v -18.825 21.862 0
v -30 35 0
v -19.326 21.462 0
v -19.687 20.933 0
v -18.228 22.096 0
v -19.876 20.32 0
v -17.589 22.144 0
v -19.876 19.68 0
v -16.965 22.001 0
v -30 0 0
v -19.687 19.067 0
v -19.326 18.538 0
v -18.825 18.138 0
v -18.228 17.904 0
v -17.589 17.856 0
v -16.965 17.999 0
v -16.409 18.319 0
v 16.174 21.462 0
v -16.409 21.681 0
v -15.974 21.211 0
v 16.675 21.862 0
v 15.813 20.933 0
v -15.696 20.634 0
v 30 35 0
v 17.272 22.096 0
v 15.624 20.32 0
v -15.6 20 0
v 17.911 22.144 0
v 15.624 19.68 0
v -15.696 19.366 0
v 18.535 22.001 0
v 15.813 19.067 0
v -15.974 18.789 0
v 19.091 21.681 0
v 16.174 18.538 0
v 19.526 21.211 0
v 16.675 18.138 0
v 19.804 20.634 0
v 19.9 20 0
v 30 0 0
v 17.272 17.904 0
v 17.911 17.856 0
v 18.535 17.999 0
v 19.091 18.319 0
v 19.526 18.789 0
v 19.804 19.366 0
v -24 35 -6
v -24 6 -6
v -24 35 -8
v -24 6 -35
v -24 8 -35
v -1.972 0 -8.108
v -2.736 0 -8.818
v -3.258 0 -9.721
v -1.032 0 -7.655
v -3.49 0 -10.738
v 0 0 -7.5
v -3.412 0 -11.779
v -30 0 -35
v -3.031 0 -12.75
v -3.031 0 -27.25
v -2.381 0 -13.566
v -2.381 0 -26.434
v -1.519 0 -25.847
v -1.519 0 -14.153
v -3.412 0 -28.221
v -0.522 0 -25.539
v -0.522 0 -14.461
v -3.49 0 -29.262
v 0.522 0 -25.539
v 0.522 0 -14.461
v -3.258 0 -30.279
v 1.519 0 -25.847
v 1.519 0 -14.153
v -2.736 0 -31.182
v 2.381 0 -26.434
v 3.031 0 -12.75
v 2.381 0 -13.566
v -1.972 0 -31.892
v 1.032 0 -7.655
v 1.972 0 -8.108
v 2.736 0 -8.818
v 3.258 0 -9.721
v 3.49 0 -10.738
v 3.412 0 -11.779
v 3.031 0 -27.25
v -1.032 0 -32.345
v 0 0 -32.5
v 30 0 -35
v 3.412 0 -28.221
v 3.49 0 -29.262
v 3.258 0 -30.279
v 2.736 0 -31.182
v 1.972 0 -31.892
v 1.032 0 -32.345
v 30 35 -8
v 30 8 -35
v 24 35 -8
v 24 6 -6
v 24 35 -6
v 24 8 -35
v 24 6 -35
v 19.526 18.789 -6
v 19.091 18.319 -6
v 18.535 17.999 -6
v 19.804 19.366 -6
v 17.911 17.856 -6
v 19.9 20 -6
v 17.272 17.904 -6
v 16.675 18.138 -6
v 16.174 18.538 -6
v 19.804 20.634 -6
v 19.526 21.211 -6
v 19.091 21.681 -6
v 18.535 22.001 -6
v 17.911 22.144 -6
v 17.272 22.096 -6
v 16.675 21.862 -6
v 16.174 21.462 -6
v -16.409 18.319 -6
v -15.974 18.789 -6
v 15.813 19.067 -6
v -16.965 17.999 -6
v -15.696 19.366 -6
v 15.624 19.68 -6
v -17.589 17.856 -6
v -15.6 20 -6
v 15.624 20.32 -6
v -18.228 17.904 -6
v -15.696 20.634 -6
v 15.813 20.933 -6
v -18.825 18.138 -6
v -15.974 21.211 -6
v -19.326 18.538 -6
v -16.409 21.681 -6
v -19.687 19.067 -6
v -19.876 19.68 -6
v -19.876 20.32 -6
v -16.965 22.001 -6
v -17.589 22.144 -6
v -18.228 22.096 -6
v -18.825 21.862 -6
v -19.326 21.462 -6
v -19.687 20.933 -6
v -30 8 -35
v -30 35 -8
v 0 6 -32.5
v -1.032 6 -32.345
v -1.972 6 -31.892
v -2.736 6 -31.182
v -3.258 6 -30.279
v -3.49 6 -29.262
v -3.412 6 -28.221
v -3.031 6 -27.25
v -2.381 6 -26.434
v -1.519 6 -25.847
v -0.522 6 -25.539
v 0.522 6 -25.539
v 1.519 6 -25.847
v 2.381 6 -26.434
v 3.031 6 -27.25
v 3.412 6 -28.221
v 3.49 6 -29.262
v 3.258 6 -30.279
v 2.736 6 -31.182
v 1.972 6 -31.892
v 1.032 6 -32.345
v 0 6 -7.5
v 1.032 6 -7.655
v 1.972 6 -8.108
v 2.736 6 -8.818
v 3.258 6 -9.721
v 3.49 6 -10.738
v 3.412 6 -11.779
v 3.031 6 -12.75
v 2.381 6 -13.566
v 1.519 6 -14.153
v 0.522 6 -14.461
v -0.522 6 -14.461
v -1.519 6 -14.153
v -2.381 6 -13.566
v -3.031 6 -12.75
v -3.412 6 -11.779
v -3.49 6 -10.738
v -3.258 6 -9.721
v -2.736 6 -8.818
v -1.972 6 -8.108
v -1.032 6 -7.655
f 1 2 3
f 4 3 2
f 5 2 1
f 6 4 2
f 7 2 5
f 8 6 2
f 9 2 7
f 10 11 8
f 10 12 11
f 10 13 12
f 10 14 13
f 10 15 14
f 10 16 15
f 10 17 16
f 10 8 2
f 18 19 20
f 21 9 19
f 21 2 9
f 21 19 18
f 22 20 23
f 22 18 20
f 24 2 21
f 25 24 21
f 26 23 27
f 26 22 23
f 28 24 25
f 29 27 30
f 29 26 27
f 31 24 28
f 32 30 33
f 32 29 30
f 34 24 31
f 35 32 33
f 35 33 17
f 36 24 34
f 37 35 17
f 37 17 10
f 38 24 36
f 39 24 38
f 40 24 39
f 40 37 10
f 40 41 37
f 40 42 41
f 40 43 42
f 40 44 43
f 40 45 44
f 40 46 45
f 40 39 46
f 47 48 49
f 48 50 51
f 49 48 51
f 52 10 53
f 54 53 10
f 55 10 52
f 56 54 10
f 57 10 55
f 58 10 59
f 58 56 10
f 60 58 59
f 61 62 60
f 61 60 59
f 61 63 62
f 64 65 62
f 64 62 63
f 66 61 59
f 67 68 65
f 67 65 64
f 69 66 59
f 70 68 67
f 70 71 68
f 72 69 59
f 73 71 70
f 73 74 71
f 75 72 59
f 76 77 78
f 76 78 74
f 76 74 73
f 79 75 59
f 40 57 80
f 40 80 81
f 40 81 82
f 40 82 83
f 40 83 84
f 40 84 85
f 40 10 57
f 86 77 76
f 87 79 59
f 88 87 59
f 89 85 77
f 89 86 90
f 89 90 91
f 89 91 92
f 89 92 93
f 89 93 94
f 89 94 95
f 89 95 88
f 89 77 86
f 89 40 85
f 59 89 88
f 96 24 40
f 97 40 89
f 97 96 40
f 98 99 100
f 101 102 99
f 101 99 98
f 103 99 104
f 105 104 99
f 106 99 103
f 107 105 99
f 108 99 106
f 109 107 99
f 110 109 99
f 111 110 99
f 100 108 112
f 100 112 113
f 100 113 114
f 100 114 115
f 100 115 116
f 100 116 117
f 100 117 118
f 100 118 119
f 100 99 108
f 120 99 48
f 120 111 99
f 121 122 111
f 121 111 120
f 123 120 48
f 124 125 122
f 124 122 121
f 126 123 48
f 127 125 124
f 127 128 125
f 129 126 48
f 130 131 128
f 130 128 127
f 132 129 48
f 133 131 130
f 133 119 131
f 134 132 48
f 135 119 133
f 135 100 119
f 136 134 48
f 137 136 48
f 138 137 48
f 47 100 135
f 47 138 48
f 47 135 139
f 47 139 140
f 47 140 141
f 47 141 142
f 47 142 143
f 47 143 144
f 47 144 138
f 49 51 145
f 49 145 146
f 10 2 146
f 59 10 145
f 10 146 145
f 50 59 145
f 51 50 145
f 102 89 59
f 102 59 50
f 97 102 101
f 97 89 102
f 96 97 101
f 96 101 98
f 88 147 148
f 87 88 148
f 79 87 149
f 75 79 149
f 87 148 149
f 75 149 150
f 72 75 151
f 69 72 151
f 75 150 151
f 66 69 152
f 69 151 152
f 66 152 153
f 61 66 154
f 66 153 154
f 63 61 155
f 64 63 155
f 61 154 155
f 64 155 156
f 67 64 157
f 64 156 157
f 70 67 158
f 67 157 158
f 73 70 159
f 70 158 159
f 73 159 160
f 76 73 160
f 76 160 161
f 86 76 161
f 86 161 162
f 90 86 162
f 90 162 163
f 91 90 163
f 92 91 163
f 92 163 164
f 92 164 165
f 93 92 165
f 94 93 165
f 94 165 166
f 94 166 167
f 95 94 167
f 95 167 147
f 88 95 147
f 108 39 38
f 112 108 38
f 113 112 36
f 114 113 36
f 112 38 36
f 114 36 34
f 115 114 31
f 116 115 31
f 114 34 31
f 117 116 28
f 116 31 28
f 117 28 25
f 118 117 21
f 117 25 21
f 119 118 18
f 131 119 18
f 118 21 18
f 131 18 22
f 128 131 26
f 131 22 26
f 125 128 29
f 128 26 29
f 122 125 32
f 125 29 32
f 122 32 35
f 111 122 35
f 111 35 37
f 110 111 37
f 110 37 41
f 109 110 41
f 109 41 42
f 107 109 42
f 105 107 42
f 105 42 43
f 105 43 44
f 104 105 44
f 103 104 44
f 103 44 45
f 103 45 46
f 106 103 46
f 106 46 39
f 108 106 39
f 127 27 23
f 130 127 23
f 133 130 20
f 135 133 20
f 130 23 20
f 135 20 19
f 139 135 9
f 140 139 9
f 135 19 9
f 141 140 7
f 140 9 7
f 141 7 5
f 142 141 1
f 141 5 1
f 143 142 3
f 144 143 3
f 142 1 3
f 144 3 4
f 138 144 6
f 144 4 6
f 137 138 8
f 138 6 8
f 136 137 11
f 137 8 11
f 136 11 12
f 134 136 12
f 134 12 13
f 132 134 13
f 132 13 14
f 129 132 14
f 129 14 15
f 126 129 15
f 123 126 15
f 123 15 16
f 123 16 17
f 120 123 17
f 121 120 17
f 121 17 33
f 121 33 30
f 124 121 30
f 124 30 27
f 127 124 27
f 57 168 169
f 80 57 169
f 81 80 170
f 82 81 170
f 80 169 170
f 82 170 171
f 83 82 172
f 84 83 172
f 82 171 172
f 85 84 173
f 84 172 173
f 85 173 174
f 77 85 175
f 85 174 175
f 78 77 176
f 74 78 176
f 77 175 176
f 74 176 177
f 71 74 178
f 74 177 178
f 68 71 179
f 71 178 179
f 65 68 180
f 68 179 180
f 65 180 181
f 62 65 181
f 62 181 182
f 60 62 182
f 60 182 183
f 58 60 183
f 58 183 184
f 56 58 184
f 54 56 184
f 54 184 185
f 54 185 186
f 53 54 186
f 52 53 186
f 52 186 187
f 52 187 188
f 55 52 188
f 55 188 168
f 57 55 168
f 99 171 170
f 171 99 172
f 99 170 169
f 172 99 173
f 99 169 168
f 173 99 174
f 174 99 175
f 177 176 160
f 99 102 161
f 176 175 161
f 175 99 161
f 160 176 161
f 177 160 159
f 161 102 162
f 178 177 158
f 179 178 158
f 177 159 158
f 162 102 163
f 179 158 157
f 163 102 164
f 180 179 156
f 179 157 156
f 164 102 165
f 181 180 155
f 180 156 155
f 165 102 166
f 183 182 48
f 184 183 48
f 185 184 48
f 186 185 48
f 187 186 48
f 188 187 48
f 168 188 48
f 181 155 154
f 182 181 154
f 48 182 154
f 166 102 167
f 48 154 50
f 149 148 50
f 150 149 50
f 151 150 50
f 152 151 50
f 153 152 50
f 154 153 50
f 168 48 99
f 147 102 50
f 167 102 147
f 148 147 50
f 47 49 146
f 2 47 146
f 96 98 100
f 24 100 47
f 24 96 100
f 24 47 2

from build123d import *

# Parameters (mm, degrees)
BOSS_EXTRUDE1_DEPTH = 30
SKETCH5_W           = 48
SKETCH5_H           = 29
CUT_EXTRUDE1_DEPTH  = 29
SKETCH4_R           = 2.15
CUT_EXTRUDE2_DEPTH  = 58.879184514
SKETCH6_R           = 3.5
CUT_EXTRUDE3_DEPTH  = 55.460995217


with BuildPart() as part:
    # Sketch2 → Boss-Extrude1 (new, symmetric)
    with BuildSketch(Plane(origin=(0, 0, 0), x_dir=(0, 0, -1), z_dir=(1, 0, 0))):
        Polygon((0, 0), (35, 0), (35, 8), (8, 35), (0, 35), align=None)
    extrude(amount=BOSS_EXTRUDE1_DEPTH, both=True)

    # Sketch5 → Cut-Extrude1 (cut)
    with BuildSketch(Plane(origin=(0, 0, -35), x_dir=(-1, 0, 0), z_dir=(0, 0, -1))):
        with Locations((0, 20.5)):
            Rectangle(SKETCH5_W, SKETCH5_H)
    extrude(amount=-CUT_EXTRUDE1_DEPTH, mode=Mode.SUBTRACT)

    # Sketch4 → Cut-Extrude2 (cut, through all)
    with BuildSketch(Plane.XY):
        with Locations((-17.75, 20)):
            Circle(SKETCH4_R)
        with Locations((17.75, 20)):
            Circle(SKETCH4_R)
    extrude(amount=-CUT_EXTRUDE2_DEPTH, mode=Mode.SUBTRACT)

    # Sketch6 → Cut-Extrude3 (cut, through all)
    with BuildSketch(Plane(origin=(0, 6, 0), x_dir=(1, 0, 0), z_dir=(0, 1, 0))):
        with Locations(Location((0, 11, 0), (0, 0, 270))):
            Circle(SKETCH6_R)
        with Locations(Location((0, 29, 0), (0, 0, 90))):
            Circle(SKETCH6_R)
    extrude(amount=-CUT_EXTRUDE3_DEPTH, mode=Mode.SUBTRACT)


solid = part.part
